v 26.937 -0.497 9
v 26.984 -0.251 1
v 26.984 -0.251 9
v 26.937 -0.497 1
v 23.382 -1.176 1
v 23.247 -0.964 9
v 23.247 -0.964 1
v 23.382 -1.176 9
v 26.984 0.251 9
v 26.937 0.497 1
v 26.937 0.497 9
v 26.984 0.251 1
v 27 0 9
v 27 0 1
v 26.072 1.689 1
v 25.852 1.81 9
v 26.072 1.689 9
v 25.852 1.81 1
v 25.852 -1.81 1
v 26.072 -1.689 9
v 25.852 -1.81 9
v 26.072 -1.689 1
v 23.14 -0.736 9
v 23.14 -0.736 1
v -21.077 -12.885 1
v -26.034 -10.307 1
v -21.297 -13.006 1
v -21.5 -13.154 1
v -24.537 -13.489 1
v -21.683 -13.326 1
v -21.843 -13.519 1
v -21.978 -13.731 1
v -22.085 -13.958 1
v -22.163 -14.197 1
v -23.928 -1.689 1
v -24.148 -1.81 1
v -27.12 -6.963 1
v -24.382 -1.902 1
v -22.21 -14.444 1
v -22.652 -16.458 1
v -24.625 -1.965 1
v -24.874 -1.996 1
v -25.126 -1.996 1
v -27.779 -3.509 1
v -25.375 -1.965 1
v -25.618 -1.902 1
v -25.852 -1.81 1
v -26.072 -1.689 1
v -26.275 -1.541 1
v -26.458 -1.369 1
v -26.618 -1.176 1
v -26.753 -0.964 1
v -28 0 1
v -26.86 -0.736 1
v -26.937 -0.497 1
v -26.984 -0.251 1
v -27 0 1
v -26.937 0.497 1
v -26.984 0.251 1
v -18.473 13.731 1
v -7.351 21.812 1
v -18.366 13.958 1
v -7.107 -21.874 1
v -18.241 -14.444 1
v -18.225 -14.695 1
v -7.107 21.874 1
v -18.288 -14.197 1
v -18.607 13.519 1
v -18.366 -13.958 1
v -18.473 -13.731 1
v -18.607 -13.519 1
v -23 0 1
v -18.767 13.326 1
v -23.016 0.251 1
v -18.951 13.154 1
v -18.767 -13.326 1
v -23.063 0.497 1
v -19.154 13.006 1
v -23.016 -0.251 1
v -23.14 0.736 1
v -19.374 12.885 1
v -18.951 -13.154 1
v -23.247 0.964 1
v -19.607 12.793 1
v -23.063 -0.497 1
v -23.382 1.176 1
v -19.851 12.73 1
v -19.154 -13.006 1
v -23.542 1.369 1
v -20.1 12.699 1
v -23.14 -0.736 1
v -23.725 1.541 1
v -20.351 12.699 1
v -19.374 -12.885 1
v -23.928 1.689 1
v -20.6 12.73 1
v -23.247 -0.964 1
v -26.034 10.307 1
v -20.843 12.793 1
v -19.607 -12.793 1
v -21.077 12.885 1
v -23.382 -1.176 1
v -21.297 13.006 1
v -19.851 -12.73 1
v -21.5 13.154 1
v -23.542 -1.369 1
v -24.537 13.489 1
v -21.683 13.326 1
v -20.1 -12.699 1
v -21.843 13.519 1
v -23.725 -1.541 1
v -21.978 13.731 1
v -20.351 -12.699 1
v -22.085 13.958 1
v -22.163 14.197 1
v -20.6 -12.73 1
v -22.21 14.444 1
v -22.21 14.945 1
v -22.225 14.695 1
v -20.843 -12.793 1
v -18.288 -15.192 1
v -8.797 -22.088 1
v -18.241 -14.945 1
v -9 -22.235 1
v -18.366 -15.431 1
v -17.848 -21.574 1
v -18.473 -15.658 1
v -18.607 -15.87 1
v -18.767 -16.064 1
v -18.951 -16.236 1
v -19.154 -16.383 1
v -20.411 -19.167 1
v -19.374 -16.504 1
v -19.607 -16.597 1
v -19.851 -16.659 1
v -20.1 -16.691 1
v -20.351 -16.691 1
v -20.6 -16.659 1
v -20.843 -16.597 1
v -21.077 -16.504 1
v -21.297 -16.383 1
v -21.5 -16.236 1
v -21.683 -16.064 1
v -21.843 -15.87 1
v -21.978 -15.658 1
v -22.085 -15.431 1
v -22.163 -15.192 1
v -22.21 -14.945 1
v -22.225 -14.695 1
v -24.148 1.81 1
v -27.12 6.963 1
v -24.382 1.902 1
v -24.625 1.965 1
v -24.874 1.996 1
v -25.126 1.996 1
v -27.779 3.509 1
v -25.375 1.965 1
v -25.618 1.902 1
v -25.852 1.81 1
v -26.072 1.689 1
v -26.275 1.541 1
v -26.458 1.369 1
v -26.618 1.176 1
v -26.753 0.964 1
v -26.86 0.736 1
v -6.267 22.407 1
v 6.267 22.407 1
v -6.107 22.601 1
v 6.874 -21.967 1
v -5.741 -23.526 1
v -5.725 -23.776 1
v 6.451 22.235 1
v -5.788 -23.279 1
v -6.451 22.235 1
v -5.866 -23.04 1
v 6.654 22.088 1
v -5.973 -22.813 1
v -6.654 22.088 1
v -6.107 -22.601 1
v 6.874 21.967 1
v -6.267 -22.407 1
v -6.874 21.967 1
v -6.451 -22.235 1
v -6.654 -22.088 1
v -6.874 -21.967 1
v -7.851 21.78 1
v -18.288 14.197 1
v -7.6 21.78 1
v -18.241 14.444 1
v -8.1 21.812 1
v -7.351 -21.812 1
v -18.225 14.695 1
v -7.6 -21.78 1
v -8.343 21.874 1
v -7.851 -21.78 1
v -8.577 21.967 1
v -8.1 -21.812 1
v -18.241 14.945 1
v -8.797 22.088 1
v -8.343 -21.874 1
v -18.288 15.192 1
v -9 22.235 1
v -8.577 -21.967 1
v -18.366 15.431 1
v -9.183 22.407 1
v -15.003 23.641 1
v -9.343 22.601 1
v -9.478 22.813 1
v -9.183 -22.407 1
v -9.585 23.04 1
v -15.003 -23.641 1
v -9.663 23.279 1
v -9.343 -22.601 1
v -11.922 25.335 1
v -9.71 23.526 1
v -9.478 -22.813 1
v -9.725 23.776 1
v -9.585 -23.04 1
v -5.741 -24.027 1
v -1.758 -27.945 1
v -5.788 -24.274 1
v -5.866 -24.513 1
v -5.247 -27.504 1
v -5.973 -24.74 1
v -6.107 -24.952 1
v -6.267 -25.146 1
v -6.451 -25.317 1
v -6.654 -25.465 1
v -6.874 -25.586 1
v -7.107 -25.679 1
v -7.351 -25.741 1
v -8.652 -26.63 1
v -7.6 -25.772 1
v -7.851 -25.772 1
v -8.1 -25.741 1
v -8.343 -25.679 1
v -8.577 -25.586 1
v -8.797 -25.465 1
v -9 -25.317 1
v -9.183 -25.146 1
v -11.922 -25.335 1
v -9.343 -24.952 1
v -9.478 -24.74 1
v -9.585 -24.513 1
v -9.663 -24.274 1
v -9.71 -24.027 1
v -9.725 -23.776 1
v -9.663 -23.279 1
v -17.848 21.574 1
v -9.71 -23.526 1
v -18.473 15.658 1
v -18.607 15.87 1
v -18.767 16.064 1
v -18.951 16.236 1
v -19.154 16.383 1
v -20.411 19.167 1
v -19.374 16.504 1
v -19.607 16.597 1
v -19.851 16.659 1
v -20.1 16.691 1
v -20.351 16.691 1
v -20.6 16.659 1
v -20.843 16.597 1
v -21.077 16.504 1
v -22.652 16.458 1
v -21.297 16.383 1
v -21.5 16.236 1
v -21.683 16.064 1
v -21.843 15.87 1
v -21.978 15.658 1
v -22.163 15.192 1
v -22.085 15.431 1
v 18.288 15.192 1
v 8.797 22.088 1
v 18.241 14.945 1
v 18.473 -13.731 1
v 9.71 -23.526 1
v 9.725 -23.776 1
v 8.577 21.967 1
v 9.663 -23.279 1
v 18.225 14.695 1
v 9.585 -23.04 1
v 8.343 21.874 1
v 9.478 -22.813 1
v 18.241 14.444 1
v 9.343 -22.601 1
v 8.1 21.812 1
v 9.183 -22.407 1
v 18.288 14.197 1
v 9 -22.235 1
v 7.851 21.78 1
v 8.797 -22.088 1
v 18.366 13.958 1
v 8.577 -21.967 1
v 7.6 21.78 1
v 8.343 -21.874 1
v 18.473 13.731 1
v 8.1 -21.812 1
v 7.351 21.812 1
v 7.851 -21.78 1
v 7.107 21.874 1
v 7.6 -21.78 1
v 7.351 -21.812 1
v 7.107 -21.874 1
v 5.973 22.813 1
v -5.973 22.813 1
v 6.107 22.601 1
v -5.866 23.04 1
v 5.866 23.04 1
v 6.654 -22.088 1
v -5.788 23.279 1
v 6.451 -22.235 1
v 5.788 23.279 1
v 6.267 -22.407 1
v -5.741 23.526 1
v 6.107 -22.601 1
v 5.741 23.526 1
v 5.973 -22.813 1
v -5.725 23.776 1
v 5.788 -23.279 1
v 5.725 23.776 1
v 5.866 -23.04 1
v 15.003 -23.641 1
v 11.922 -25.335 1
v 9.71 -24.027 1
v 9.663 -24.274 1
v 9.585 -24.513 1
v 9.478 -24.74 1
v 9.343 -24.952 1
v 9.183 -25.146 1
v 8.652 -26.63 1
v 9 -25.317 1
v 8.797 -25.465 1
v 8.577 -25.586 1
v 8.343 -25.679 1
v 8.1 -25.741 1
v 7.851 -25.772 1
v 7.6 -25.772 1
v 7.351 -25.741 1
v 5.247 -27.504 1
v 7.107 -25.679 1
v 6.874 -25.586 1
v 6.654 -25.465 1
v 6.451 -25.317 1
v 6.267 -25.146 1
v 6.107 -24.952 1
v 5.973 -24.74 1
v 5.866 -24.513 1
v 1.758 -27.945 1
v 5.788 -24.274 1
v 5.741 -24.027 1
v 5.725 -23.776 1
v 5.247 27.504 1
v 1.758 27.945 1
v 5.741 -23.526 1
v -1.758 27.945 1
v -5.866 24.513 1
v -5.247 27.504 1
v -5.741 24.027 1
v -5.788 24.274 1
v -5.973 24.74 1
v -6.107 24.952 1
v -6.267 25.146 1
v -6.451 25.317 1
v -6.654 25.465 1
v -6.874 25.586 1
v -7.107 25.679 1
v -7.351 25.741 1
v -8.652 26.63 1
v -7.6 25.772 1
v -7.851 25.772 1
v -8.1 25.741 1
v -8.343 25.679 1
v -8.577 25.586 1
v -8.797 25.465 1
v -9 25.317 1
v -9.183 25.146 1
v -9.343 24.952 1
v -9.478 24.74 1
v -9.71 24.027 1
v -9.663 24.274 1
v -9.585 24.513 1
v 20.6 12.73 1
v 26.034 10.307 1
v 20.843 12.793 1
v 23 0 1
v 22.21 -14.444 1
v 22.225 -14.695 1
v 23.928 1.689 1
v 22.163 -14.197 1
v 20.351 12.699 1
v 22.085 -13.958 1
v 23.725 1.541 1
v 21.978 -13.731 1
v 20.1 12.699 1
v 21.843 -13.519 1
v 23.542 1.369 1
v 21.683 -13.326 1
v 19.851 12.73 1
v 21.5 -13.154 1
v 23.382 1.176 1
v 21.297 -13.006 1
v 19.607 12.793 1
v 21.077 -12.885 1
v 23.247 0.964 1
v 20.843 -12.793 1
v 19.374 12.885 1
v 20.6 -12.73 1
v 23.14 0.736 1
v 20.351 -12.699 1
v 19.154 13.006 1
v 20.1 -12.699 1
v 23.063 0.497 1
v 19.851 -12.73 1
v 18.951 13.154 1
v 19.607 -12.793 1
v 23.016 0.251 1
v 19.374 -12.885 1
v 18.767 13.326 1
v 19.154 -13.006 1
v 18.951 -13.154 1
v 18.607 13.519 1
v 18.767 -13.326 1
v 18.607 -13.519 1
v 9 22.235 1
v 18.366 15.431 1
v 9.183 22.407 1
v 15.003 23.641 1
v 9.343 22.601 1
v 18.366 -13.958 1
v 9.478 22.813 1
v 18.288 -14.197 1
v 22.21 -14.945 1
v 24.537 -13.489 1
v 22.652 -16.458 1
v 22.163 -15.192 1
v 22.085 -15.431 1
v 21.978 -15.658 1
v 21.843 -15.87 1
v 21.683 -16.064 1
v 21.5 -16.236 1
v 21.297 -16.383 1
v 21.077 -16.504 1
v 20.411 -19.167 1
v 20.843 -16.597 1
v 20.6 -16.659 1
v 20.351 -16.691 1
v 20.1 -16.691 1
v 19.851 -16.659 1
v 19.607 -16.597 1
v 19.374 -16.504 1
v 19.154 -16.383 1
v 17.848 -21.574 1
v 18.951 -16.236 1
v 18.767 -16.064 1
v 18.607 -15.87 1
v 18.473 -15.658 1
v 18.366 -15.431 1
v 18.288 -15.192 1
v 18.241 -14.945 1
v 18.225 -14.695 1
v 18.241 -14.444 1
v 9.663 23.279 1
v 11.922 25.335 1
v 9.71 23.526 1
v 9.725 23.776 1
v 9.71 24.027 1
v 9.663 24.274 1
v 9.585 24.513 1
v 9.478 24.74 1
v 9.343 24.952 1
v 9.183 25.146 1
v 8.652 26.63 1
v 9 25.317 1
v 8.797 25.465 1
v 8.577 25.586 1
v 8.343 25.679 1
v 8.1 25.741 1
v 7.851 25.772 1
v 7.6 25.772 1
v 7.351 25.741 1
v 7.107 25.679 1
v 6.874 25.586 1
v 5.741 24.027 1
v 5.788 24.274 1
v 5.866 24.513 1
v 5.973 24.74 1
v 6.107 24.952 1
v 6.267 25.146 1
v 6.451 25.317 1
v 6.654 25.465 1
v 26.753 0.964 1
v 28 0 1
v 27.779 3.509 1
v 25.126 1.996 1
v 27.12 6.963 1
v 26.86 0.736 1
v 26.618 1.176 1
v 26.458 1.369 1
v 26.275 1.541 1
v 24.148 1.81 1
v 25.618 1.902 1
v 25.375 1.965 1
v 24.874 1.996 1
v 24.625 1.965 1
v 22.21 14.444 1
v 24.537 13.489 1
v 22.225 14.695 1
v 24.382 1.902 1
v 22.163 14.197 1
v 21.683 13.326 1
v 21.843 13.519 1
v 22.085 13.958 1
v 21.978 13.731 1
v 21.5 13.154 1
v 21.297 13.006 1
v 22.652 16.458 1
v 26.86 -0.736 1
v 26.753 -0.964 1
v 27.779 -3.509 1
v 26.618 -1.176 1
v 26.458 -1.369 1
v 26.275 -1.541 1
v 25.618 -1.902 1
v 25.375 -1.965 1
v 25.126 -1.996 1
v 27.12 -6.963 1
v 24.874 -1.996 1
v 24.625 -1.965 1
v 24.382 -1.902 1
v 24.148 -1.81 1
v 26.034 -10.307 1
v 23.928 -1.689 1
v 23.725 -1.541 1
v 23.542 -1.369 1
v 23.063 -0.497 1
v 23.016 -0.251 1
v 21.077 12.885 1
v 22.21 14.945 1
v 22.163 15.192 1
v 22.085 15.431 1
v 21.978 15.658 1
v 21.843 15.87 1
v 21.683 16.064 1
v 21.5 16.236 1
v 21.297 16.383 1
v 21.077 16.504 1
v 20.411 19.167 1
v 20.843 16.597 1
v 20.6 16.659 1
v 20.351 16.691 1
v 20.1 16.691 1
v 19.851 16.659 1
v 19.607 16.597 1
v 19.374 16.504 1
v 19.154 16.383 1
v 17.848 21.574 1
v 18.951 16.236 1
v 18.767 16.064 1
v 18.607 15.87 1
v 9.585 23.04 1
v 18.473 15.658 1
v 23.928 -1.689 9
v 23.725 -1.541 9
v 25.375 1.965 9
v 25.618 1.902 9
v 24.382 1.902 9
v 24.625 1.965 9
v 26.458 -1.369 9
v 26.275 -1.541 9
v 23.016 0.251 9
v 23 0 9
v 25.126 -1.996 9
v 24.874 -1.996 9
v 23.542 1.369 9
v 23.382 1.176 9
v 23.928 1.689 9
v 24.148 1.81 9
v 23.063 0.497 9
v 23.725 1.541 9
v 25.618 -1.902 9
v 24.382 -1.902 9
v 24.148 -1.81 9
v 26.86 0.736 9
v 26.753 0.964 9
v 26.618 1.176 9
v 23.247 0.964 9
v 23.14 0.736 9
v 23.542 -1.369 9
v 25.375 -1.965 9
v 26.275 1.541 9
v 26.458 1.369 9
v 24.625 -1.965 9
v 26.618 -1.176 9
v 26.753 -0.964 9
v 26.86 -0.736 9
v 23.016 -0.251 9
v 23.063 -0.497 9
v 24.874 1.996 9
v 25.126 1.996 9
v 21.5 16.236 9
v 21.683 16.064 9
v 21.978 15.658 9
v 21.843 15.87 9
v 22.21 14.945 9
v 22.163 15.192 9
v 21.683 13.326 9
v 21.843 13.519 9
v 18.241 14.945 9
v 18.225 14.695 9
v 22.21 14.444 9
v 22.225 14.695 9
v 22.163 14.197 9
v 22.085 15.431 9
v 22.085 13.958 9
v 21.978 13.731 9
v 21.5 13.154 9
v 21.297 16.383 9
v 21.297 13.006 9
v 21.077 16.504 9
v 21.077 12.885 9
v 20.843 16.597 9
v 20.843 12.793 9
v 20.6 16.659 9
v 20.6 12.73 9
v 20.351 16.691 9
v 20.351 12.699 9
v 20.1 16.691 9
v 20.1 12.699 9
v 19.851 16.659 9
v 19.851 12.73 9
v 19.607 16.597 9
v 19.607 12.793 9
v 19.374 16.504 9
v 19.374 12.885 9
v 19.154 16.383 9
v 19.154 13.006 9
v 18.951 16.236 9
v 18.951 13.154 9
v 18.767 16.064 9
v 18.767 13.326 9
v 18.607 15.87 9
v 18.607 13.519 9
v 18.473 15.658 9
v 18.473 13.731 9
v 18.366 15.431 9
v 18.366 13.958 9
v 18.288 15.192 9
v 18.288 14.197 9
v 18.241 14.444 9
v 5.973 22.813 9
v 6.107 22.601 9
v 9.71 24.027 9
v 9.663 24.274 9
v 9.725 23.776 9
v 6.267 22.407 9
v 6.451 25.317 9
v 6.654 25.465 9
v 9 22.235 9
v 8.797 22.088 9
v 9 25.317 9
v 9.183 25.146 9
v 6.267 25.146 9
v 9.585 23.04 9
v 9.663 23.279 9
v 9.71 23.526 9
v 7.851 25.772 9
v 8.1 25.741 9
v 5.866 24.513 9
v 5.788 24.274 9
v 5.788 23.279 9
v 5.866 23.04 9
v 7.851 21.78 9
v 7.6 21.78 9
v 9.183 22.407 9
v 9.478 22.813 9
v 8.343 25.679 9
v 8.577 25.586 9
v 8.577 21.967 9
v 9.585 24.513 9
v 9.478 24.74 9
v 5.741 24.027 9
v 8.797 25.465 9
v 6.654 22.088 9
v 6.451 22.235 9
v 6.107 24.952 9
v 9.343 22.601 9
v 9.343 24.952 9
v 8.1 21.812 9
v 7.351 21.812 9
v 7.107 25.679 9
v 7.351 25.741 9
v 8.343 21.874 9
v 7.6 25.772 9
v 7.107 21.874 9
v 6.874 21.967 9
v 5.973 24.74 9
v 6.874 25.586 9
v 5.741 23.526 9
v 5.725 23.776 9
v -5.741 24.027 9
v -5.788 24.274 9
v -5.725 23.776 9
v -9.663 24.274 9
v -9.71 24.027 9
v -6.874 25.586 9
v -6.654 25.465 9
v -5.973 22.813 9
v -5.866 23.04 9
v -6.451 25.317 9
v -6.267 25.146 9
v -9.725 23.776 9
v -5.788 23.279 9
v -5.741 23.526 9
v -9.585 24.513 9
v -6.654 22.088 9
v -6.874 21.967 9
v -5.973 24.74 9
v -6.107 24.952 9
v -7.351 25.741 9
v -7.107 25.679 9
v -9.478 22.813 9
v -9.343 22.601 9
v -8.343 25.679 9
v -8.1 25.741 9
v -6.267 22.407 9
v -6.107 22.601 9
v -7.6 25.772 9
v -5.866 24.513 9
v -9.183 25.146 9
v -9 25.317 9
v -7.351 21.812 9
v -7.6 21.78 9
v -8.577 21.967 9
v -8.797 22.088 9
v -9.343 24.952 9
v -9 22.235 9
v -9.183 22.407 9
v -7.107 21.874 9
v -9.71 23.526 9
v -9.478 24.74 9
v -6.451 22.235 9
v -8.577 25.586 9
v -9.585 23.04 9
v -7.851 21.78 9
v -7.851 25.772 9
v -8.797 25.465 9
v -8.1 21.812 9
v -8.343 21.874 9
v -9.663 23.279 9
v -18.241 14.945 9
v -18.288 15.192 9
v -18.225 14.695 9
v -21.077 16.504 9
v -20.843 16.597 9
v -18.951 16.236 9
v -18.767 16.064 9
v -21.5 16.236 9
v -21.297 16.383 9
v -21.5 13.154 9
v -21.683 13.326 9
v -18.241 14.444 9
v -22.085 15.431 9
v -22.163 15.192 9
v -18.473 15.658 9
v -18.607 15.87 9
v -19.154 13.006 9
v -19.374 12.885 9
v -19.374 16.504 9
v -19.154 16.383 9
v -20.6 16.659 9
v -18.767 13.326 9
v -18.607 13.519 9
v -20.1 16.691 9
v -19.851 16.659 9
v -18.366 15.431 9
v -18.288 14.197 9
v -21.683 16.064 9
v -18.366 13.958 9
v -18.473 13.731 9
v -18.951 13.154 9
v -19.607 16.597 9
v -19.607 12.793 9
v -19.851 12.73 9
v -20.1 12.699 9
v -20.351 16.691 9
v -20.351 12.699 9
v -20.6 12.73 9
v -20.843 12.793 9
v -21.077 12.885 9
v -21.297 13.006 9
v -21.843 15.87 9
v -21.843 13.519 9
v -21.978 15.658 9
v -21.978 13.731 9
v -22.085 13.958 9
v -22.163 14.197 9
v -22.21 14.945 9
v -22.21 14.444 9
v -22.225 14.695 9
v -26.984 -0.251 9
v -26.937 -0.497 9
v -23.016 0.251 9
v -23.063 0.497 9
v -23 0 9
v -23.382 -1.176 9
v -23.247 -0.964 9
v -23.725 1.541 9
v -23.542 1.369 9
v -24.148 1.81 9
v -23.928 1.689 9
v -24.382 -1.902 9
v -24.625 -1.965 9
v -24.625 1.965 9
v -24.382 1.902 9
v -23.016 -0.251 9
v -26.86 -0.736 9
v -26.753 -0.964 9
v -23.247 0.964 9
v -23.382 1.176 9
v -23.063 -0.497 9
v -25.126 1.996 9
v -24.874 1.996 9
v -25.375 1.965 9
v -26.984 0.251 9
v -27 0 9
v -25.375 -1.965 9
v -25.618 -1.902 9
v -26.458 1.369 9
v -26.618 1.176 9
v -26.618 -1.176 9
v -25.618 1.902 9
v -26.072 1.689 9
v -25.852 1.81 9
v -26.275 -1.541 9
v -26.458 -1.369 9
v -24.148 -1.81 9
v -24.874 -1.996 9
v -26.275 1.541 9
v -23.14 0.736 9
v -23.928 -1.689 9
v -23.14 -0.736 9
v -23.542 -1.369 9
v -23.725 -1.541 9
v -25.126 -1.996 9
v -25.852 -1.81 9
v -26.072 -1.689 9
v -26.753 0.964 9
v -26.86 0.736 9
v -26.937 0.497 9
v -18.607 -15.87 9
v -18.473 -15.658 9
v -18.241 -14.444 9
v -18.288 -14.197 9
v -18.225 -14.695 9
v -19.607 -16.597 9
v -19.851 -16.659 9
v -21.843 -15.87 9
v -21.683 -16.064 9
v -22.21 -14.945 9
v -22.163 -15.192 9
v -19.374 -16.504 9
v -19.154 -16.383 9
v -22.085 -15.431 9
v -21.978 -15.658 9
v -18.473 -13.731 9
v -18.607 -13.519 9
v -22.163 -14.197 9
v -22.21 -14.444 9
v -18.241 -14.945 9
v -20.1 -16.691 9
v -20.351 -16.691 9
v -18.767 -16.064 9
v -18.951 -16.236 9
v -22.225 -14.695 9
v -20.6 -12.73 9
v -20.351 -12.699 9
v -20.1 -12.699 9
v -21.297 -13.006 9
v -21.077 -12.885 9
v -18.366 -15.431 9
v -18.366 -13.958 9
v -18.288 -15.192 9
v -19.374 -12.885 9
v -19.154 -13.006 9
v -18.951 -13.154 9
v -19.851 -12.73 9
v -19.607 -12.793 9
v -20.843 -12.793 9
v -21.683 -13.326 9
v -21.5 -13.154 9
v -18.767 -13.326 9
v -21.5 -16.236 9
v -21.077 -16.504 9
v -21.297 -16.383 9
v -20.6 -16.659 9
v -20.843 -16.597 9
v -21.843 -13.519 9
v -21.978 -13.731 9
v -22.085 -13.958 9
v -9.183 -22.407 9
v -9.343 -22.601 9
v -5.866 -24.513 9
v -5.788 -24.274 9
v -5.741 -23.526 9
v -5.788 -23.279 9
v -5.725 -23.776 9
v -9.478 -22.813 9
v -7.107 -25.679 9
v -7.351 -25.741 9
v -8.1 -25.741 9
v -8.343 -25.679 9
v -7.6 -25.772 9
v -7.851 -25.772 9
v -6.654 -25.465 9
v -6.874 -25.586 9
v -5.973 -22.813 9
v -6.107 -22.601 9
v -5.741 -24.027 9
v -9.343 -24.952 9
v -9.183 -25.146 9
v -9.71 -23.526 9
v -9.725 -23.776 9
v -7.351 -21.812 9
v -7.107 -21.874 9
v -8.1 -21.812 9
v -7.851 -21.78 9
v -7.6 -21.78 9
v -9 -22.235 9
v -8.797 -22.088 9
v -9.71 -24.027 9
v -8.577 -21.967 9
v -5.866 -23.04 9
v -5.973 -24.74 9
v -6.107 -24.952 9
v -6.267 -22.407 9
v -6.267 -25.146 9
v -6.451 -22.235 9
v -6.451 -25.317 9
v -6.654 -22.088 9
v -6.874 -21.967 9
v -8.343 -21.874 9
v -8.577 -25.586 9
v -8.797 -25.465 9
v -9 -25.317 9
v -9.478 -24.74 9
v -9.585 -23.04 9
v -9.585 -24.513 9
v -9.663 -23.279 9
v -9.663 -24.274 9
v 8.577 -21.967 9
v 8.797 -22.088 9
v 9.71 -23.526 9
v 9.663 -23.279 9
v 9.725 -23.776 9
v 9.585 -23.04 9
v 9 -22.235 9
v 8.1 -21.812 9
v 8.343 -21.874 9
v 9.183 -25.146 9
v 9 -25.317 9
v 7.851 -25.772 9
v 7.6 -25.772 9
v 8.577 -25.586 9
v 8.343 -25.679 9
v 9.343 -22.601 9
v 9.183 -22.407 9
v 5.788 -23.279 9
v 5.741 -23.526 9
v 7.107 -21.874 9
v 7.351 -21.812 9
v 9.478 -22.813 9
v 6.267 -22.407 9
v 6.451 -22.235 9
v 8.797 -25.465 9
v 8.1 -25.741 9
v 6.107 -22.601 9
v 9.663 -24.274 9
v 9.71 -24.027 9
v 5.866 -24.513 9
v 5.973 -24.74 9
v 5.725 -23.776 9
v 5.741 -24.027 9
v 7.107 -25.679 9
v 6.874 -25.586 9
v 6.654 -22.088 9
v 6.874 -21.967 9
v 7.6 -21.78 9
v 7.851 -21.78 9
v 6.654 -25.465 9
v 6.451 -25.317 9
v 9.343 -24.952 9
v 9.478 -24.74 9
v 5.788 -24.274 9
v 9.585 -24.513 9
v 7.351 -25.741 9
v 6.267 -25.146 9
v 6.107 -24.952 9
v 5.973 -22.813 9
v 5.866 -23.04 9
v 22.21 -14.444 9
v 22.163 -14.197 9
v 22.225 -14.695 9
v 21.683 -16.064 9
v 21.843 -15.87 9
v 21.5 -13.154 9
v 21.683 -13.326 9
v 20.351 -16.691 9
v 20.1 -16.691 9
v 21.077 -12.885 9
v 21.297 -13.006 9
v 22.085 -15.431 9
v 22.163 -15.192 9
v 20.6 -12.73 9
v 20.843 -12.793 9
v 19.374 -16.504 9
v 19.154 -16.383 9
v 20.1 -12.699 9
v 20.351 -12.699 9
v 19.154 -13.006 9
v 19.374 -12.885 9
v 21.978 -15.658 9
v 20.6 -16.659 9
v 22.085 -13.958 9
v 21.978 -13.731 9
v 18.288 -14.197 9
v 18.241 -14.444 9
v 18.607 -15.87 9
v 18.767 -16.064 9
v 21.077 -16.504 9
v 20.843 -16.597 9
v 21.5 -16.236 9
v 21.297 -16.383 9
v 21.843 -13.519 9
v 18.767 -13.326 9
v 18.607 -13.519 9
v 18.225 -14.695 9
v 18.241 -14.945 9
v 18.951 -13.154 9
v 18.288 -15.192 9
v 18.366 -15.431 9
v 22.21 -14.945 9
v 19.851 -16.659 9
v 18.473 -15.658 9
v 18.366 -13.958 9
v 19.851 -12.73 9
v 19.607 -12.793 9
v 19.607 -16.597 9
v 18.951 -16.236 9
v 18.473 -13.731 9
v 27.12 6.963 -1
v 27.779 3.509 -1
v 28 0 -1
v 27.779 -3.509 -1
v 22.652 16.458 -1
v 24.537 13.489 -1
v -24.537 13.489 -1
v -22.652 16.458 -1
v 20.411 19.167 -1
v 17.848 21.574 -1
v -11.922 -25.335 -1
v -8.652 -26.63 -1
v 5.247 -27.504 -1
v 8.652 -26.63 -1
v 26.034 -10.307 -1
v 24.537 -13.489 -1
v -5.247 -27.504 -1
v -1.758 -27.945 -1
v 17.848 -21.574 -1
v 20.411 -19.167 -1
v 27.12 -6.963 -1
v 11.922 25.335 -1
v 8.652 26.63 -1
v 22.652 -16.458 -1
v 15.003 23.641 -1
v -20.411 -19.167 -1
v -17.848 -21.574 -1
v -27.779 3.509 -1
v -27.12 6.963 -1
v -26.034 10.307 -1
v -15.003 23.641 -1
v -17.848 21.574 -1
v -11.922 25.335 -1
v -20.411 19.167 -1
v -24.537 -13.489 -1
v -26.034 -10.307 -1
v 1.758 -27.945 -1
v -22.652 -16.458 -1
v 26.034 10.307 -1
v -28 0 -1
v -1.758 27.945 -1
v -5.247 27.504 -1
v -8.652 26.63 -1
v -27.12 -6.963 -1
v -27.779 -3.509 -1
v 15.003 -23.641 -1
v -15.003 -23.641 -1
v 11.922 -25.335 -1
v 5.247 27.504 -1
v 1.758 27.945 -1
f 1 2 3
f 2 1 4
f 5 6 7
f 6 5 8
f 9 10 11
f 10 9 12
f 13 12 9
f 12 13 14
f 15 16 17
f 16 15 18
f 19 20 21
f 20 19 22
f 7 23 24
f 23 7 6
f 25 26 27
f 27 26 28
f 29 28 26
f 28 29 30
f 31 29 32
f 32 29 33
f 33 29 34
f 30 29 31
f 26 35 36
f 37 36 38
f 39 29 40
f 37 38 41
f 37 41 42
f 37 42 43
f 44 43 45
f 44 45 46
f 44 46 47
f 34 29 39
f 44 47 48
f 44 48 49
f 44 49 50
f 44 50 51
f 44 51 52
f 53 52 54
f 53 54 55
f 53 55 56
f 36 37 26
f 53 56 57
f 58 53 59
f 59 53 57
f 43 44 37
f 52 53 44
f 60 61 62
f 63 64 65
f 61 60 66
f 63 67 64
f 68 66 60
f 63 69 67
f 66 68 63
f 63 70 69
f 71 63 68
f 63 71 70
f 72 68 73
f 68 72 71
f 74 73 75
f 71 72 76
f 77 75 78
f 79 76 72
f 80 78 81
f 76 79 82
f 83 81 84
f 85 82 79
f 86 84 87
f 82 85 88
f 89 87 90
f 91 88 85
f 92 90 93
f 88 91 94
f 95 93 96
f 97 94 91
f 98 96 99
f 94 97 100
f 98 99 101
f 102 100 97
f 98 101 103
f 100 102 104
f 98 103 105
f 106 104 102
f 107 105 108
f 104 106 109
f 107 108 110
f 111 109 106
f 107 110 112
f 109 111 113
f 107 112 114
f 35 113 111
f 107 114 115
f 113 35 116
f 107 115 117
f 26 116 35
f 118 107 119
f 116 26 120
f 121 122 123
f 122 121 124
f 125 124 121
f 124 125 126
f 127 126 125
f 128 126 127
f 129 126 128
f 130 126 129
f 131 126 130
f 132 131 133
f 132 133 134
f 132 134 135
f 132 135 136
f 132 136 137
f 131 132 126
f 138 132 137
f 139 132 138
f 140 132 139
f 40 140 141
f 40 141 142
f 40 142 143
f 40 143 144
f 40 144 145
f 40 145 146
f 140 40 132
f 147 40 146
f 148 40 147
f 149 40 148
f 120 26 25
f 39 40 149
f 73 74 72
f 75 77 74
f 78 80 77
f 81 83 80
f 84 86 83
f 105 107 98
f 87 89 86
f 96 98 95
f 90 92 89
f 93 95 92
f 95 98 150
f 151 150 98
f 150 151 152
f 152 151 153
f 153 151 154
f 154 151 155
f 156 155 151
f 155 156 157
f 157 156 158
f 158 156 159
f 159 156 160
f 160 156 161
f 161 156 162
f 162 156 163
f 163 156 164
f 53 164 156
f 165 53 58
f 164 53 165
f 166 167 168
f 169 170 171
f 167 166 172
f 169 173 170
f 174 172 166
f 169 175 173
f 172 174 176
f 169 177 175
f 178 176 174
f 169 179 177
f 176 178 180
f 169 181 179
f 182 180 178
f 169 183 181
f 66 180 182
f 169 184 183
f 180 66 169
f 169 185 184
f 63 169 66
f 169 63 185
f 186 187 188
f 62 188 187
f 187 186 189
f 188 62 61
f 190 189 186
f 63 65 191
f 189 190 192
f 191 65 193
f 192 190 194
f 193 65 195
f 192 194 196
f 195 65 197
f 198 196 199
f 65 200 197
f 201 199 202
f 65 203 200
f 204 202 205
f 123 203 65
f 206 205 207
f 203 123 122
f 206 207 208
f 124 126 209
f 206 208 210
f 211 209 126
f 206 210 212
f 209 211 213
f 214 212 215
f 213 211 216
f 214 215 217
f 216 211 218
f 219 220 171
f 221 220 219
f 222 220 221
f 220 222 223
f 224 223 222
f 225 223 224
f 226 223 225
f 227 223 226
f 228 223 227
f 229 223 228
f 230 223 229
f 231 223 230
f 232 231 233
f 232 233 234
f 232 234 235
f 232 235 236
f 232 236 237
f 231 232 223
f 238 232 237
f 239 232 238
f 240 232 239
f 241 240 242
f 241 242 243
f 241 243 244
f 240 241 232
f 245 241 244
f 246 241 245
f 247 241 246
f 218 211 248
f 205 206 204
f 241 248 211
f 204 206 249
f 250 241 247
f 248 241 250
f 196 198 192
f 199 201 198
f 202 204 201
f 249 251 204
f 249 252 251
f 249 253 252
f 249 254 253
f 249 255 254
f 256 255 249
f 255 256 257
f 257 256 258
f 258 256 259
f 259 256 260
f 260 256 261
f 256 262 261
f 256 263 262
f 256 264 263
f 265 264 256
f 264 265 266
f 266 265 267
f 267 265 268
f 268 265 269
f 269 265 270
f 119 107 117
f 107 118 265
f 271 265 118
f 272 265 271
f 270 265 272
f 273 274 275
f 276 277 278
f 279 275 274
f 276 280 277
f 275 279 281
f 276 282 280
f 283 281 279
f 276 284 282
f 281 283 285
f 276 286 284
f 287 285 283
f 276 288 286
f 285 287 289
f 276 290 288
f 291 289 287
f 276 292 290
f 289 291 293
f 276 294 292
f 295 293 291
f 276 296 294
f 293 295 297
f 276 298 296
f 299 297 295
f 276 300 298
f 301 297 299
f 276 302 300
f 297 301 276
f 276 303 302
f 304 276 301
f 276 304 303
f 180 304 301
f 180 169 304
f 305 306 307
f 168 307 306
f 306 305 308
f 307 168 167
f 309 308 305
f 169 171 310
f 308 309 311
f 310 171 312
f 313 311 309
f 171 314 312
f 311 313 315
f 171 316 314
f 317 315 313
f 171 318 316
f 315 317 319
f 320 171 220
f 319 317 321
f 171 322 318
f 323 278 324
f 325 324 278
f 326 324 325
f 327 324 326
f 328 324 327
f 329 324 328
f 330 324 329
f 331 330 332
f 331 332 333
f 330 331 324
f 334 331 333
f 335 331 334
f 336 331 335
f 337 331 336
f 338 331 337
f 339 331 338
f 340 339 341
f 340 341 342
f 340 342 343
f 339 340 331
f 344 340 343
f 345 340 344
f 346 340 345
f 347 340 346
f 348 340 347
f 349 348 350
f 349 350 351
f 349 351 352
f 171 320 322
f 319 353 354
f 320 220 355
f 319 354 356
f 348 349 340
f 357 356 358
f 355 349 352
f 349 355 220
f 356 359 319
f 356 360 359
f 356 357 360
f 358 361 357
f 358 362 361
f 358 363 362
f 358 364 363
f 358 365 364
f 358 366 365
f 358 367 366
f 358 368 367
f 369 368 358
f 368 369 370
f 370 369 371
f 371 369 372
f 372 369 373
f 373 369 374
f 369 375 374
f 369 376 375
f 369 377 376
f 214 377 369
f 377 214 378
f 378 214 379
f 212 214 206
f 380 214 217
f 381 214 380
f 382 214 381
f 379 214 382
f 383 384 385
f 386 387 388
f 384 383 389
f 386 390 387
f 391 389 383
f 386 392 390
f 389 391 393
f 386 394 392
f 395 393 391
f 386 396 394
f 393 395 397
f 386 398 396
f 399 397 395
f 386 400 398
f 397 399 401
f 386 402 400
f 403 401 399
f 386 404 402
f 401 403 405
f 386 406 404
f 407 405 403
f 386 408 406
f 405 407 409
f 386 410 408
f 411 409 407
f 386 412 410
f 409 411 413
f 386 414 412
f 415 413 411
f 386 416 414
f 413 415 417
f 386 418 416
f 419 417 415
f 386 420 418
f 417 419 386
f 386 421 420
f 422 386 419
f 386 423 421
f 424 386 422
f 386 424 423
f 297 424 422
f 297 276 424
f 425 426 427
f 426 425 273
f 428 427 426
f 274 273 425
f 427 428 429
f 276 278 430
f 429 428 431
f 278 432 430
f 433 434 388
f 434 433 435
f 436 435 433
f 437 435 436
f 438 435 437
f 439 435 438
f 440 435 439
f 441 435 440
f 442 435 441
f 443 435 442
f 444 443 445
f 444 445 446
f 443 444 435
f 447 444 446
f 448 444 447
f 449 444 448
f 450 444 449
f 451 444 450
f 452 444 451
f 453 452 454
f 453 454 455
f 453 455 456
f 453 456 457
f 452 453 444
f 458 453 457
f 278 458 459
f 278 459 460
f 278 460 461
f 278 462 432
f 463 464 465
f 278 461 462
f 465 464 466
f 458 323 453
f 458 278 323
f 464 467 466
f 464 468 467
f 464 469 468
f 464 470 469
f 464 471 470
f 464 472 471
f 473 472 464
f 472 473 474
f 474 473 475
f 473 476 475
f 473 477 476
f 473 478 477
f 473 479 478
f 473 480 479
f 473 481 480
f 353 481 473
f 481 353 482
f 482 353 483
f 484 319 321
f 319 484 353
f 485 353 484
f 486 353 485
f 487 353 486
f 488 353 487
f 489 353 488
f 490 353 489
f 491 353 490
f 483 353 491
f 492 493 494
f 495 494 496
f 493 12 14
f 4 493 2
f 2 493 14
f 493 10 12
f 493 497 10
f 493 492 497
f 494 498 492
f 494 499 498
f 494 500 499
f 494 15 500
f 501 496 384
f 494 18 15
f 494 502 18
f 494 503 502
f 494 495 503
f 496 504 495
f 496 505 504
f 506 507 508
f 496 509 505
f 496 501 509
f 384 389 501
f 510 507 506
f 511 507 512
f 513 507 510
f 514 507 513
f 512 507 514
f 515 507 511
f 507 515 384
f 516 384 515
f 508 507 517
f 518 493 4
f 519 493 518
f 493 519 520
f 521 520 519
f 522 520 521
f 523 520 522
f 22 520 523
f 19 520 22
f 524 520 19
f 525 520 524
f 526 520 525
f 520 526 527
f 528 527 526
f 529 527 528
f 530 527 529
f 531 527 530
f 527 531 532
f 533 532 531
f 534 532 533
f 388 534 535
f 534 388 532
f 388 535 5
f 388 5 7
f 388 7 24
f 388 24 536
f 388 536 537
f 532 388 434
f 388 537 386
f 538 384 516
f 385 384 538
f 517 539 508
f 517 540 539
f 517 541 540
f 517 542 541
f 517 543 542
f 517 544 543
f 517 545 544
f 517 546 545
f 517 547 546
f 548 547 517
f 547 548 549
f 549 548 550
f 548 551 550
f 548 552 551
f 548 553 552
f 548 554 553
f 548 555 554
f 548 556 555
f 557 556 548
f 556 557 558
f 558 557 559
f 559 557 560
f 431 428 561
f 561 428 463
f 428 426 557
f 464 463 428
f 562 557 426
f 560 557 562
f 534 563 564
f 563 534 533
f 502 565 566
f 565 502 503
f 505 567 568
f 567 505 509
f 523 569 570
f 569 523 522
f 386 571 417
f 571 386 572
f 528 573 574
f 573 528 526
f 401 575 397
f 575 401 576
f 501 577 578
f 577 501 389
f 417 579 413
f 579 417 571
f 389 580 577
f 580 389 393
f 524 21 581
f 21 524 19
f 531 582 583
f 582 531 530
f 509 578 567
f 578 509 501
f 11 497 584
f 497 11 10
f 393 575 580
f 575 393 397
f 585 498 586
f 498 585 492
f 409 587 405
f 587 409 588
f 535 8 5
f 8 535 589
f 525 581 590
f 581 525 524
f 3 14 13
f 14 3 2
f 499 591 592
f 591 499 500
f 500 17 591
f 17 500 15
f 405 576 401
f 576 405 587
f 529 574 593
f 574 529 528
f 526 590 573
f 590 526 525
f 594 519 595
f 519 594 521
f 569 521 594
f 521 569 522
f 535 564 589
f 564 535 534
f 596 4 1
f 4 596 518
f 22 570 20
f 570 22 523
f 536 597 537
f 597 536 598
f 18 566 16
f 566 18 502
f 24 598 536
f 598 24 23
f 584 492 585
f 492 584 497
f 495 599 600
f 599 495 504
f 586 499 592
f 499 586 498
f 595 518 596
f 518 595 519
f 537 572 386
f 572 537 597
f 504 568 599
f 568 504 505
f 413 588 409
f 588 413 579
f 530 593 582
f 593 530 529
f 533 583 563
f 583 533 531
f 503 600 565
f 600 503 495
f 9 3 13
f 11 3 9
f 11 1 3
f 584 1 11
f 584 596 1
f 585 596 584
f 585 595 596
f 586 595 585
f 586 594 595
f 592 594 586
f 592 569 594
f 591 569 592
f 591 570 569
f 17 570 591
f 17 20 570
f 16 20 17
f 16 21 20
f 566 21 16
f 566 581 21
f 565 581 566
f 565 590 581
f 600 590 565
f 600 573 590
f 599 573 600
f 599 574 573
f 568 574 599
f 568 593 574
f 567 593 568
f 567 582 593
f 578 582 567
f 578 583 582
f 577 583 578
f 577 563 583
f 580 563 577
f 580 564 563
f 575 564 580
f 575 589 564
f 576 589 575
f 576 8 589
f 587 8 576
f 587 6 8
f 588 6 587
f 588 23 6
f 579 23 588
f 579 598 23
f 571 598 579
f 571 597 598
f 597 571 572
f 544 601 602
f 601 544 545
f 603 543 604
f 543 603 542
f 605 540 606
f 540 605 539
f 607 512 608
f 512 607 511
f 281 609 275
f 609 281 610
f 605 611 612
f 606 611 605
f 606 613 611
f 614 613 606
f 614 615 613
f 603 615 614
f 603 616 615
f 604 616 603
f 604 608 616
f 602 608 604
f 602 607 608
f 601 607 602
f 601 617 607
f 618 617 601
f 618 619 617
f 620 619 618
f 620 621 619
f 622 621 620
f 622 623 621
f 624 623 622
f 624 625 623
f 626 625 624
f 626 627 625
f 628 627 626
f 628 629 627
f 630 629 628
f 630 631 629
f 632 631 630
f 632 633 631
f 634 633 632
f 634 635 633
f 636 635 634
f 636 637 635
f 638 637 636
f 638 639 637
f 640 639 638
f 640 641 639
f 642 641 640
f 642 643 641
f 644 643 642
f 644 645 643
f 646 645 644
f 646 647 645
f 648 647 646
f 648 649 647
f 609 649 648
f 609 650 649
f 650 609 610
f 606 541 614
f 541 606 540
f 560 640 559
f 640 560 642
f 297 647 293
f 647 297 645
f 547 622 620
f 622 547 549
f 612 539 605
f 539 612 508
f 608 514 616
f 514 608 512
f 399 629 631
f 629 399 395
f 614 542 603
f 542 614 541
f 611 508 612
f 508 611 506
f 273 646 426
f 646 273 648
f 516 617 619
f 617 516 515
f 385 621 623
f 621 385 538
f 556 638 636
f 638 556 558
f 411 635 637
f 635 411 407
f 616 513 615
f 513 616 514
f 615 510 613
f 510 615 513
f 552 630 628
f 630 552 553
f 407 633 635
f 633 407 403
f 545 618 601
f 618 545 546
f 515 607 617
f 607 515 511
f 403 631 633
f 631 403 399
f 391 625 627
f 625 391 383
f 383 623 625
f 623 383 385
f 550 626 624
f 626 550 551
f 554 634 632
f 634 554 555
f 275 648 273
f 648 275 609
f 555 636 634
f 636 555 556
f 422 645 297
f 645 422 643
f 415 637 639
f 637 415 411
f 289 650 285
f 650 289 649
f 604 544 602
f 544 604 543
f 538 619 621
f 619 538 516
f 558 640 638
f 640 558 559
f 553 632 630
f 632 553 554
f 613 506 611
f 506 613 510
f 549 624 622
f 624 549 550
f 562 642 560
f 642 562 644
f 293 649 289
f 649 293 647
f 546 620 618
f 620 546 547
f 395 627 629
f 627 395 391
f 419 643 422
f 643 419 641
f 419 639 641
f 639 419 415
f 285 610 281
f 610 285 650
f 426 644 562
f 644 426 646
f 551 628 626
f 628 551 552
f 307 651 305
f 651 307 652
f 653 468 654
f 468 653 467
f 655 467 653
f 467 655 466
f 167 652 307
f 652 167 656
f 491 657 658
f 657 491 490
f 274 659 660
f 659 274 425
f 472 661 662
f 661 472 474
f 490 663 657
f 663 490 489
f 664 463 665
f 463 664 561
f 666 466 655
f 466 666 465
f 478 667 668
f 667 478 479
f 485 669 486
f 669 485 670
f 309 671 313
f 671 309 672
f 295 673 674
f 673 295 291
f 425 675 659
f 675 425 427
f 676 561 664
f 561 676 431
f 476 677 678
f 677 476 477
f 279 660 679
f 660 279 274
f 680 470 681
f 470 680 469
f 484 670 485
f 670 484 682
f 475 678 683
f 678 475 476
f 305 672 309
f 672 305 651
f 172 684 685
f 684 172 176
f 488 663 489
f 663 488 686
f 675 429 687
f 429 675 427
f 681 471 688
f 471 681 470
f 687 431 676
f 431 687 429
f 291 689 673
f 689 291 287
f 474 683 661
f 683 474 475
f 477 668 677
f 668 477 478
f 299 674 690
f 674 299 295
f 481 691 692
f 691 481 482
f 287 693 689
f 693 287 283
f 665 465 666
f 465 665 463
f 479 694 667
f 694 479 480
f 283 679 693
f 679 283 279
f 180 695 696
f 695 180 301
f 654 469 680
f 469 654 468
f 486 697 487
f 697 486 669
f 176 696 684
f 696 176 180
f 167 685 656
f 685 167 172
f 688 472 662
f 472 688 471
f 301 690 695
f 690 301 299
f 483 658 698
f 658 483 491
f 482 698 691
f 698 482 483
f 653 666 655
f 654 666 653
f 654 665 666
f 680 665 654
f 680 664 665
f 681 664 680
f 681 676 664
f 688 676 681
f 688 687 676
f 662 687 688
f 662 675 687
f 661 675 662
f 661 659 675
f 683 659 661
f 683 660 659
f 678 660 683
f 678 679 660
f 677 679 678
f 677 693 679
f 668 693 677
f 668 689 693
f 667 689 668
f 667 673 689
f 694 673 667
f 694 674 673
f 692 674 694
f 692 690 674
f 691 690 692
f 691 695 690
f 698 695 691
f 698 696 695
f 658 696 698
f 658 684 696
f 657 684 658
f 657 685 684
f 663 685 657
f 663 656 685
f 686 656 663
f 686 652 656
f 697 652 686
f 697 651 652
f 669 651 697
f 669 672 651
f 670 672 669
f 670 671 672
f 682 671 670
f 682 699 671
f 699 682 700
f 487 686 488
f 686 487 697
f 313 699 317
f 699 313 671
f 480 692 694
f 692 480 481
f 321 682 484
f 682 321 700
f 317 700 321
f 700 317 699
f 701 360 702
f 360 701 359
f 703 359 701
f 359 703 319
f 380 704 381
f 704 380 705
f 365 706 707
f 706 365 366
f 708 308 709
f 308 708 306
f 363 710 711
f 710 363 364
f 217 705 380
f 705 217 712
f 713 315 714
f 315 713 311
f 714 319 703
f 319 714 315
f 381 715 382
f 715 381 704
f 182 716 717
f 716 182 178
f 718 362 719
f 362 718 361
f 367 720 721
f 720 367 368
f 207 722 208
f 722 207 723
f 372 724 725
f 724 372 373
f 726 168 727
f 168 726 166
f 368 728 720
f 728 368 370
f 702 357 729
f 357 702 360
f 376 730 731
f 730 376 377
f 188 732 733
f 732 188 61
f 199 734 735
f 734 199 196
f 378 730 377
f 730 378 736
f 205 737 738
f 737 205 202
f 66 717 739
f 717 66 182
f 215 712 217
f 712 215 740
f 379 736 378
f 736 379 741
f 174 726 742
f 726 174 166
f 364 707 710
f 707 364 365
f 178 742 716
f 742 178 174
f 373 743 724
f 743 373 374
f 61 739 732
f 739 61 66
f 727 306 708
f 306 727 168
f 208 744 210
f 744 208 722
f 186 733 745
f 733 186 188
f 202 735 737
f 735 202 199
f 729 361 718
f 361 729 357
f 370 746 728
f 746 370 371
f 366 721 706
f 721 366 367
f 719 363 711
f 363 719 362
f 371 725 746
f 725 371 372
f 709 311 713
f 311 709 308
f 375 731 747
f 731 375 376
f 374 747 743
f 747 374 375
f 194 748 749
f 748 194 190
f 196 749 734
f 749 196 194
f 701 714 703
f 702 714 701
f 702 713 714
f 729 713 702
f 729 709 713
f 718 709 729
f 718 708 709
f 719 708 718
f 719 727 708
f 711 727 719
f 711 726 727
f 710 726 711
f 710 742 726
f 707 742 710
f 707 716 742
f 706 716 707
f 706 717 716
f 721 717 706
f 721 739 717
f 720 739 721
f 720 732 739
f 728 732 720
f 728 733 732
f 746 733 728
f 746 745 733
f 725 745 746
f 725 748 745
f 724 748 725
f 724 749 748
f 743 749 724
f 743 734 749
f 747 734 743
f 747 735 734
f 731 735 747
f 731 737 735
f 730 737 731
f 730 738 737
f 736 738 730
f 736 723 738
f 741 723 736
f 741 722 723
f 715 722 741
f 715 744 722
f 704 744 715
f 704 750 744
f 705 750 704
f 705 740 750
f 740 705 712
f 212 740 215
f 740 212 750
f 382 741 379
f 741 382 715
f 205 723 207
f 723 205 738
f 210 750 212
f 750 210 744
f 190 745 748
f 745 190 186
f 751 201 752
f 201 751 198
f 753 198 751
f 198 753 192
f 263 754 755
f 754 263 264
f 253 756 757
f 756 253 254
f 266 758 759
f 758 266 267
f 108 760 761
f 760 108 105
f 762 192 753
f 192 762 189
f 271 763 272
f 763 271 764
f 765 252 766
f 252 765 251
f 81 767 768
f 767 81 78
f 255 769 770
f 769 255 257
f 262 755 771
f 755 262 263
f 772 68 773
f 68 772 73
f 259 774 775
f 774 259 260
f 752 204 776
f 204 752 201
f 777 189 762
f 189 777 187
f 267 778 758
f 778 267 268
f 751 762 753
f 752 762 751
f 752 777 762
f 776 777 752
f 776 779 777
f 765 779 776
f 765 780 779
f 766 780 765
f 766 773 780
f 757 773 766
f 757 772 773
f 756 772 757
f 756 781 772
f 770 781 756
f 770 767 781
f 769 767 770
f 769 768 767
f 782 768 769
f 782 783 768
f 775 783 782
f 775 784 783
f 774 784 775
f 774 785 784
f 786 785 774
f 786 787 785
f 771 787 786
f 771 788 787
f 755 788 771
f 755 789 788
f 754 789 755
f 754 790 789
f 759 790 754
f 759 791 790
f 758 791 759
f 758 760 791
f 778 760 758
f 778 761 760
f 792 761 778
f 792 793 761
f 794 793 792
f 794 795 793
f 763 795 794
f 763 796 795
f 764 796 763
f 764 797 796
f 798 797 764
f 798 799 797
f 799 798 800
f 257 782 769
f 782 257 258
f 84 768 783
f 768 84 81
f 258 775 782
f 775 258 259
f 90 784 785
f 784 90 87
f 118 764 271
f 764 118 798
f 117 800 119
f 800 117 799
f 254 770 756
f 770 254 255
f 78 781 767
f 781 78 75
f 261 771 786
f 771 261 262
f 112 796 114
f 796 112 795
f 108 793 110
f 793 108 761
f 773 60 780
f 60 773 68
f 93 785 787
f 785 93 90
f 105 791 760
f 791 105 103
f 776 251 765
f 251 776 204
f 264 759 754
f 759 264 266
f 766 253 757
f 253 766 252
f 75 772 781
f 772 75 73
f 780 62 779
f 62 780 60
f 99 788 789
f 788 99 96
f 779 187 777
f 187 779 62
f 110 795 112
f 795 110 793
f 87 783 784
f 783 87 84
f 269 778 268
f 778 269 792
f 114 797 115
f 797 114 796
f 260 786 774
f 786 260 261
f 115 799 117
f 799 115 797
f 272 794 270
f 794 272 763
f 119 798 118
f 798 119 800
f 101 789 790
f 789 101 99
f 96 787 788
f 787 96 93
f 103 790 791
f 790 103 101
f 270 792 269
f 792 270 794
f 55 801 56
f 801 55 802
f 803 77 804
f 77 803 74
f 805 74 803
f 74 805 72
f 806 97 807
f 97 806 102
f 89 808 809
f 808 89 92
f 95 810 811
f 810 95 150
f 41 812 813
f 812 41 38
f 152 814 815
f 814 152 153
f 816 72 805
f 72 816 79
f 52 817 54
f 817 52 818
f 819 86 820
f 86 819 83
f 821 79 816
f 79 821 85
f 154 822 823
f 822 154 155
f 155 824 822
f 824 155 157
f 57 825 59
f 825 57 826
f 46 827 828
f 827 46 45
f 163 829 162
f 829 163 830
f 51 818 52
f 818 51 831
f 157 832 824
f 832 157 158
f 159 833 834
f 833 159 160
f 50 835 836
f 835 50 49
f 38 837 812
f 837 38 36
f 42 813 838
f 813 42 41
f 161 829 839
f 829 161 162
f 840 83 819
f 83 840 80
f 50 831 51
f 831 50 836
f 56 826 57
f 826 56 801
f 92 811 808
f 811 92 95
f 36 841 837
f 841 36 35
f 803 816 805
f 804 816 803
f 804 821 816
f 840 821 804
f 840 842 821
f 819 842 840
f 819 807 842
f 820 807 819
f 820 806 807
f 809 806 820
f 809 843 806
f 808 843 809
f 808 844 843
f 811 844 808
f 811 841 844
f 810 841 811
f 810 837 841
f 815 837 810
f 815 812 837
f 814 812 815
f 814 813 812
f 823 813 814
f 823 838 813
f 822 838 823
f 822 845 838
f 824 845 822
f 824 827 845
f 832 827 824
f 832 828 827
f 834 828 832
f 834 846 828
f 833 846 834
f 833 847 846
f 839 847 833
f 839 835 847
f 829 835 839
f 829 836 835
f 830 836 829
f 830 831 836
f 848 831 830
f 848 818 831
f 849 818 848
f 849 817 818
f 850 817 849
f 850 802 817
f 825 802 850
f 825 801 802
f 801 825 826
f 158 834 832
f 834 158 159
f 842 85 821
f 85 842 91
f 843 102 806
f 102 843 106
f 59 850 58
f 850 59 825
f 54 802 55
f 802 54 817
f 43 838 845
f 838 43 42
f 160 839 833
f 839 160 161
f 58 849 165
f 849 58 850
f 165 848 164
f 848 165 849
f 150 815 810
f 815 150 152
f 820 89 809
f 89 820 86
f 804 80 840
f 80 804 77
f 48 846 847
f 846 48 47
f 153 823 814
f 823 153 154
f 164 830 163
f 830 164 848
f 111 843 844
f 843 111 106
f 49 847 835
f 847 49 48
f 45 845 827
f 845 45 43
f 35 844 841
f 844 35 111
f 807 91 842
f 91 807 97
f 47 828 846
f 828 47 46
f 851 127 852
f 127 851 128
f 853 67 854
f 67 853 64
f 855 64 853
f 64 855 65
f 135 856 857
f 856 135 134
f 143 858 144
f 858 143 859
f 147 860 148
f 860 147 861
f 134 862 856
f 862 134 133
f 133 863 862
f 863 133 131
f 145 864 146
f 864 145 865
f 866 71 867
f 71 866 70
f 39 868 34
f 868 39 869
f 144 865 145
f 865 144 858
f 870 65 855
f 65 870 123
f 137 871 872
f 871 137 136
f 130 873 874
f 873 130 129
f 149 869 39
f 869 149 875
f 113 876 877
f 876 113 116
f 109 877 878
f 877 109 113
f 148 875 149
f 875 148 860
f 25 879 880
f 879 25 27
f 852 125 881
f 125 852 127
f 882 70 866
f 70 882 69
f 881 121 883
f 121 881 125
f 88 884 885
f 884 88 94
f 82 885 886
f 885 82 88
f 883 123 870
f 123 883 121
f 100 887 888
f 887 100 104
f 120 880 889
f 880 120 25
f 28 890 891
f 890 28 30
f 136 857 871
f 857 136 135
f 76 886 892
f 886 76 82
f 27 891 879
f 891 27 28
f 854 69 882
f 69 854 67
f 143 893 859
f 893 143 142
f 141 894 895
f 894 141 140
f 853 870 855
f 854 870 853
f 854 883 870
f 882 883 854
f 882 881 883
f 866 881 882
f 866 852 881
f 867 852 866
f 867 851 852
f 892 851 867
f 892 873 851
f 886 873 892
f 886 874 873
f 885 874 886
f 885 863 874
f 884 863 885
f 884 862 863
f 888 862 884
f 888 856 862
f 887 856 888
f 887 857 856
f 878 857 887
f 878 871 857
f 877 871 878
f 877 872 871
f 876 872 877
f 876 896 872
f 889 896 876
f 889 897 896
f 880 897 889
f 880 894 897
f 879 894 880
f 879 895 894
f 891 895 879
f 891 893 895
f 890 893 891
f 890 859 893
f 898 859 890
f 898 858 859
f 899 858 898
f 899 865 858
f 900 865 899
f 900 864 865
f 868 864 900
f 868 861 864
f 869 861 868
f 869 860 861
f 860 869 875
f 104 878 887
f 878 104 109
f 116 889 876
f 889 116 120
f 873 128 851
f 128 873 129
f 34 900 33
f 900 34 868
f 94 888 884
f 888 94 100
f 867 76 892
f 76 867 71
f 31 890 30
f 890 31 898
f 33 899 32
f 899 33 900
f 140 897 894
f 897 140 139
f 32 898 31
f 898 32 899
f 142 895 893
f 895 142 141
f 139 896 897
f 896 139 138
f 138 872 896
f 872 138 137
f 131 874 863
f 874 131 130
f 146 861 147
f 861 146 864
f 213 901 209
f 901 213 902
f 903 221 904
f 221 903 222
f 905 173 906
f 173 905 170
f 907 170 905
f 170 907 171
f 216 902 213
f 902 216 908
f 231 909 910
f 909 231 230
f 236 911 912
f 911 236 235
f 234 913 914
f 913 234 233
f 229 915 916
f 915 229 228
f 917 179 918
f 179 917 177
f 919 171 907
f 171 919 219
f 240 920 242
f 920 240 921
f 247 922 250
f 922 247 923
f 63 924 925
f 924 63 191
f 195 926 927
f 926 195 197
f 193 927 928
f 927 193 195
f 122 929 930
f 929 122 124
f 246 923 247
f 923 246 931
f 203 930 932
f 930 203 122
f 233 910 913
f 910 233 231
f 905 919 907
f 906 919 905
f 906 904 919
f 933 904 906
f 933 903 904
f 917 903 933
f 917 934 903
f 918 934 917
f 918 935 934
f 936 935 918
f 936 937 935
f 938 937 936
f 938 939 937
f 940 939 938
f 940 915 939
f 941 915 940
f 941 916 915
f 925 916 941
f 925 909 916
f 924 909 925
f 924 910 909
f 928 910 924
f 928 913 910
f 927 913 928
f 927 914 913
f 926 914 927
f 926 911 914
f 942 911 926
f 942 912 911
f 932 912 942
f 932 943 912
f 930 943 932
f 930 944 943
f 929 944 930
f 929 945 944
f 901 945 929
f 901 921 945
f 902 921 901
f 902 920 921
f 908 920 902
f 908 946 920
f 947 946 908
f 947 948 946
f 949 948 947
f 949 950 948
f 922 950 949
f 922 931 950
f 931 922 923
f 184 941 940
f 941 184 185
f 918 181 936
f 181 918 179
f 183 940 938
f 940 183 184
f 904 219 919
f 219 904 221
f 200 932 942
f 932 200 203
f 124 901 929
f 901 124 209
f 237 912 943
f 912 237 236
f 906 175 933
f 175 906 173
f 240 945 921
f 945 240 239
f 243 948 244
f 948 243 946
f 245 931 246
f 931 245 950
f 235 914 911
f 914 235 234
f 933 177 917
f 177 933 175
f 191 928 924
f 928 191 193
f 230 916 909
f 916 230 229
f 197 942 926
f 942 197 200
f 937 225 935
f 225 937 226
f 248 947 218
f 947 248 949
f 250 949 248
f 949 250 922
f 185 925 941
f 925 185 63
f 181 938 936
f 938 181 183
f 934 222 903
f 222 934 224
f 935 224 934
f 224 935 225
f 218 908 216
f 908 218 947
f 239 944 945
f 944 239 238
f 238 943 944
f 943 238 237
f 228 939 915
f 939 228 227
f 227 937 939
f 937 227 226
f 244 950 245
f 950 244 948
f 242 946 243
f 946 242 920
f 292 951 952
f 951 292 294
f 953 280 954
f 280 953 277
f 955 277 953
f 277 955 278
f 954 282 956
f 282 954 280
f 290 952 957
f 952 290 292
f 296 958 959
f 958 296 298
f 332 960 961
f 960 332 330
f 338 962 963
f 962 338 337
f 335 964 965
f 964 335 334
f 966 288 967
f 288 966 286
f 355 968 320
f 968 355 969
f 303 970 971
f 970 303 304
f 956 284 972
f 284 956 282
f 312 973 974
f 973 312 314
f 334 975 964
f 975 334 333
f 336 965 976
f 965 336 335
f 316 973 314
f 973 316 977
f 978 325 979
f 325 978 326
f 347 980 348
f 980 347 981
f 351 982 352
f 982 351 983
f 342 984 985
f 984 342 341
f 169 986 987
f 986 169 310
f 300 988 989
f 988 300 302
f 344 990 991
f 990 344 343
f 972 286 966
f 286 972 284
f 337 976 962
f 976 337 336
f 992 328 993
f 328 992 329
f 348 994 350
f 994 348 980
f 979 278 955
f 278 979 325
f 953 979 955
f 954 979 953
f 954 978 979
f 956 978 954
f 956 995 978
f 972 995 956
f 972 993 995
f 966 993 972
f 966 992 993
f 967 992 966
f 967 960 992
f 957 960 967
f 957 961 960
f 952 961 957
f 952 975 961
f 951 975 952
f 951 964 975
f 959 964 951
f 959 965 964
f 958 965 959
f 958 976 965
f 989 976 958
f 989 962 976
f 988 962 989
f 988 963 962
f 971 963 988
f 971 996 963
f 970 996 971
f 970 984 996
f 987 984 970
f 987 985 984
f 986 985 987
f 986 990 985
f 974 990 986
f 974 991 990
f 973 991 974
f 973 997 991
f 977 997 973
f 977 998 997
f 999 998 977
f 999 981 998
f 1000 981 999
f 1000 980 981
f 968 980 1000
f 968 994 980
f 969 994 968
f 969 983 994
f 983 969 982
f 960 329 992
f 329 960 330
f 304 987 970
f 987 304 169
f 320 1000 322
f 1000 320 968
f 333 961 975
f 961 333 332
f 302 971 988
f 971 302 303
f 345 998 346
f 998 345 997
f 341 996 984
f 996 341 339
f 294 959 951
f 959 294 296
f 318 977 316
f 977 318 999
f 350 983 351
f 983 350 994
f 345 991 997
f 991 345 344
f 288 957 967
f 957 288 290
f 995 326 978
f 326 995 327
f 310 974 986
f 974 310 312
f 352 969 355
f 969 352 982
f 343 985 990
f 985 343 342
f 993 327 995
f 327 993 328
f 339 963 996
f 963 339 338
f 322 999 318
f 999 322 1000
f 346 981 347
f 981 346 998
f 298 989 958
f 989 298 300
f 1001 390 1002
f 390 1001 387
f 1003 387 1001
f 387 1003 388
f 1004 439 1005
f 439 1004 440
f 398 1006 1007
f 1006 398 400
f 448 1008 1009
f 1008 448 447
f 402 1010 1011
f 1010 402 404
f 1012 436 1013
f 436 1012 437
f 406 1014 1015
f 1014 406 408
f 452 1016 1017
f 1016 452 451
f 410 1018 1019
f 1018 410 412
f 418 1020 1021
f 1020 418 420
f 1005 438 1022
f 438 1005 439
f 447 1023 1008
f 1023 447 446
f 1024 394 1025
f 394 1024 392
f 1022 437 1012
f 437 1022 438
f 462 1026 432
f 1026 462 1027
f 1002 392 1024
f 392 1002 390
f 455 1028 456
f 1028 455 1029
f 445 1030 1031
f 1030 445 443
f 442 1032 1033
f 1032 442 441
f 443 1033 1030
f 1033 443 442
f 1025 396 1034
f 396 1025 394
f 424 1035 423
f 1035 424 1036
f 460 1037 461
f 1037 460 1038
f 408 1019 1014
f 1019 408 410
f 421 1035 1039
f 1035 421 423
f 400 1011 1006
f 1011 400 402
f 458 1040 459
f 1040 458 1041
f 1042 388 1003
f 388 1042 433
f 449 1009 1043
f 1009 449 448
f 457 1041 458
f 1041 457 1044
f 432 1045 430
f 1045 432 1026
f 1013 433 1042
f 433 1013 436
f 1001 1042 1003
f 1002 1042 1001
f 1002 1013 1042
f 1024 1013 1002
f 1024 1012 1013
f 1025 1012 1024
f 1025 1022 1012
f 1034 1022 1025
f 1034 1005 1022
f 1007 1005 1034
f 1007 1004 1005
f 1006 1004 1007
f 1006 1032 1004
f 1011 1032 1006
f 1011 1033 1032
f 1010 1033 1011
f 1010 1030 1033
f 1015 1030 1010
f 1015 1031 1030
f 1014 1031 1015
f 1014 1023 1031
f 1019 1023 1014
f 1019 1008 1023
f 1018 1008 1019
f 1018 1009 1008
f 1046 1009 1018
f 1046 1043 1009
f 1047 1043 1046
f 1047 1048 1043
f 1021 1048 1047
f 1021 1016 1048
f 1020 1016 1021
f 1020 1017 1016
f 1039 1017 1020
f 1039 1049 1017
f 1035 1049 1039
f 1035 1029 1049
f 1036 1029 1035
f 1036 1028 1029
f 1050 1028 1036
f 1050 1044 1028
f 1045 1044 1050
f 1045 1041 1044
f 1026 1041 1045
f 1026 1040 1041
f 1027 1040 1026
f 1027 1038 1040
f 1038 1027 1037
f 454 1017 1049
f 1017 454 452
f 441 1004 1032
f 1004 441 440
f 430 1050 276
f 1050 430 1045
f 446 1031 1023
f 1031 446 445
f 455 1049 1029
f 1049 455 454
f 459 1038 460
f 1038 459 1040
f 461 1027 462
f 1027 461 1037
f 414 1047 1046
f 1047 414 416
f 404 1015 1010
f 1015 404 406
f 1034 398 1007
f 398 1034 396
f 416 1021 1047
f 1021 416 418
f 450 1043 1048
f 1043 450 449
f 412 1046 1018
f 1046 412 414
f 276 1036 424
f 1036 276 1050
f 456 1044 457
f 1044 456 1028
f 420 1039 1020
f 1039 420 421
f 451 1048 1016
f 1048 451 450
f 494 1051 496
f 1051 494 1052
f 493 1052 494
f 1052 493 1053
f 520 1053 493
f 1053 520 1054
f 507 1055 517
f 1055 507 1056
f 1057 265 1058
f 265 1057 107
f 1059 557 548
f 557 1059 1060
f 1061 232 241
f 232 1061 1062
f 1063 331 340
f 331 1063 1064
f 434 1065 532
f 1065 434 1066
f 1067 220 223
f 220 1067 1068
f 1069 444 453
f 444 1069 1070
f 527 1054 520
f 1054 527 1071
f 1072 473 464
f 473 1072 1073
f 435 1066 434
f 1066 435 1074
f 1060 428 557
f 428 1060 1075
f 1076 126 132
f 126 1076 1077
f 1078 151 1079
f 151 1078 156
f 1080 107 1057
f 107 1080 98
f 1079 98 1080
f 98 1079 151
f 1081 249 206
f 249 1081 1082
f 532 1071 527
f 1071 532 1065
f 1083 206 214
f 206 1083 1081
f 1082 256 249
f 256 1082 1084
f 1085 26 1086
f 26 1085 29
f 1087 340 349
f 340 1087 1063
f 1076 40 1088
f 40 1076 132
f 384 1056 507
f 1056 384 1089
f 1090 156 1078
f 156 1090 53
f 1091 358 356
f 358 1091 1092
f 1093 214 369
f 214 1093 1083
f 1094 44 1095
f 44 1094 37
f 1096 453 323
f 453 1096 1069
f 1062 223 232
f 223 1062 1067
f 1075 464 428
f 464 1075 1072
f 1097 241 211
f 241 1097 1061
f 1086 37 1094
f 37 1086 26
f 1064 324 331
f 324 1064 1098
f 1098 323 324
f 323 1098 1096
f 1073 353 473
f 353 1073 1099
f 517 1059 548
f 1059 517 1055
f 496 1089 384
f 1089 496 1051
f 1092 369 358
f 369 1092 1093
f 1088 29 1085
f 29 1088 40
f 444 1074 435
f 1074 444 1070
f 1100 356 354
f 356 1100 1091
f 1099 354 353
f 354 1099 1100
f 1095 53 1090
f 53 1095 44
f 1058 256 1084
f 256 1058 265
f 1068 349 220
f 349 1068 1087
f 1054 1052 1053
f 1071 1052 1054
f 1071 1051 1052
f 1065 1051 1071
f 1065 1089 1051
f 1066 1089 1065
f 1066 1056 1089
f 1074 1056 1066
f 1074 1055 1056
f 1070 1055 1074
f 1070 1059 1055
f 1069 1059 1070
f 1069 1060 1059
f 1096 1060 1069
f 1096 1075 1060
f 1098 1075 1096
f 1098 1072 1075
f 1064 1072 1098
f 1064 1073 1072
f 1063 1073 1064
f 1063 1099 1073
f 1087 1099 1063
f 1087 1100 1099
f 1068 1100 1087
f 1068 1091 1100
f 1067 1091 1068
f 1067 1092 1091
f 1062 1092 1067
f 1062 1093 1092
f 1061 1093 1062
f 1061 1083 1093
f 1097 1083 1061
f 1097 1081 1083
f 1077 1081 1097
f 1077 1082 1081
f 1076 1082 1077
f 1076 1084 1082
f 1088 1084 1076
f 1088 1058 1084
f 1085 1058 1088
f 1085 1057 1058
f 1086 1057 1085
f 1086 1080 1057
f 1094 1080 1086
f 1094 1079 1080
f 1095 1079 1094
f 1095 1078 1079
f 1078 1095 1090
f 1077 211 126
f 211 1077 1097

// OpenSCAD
/**
 * Glass Inner bottom (Ikea glass)
 * @Author Wilfried Loche
 * @Created Jan 11, 2017
 */

/* Plater radius */
radius = 28; /*27*/
/* Nb of feet */
nbFeet = 10;
/* Feet radius */
feetRadius = 2;
/* Feet height */
feetHeight = 8;
/* Inner feet gap */
feetInnerGap = 1;


cylinder(h=2, r=radius, center=true, $fn=50);

for (n = [ 0 : nbFeet - 1 ])
    translate([
        (radius-feetRadius - feetInnerGap) * cos(360 * n / nbFeet),
        (radius-feetRadius - feetInnerGap) * sin(360 * n / nbFeet),
        feetHeight/2+1
    ])
    cylinder(h=feetHeight, r=feetRadius, center=true, $fn=50)
;
